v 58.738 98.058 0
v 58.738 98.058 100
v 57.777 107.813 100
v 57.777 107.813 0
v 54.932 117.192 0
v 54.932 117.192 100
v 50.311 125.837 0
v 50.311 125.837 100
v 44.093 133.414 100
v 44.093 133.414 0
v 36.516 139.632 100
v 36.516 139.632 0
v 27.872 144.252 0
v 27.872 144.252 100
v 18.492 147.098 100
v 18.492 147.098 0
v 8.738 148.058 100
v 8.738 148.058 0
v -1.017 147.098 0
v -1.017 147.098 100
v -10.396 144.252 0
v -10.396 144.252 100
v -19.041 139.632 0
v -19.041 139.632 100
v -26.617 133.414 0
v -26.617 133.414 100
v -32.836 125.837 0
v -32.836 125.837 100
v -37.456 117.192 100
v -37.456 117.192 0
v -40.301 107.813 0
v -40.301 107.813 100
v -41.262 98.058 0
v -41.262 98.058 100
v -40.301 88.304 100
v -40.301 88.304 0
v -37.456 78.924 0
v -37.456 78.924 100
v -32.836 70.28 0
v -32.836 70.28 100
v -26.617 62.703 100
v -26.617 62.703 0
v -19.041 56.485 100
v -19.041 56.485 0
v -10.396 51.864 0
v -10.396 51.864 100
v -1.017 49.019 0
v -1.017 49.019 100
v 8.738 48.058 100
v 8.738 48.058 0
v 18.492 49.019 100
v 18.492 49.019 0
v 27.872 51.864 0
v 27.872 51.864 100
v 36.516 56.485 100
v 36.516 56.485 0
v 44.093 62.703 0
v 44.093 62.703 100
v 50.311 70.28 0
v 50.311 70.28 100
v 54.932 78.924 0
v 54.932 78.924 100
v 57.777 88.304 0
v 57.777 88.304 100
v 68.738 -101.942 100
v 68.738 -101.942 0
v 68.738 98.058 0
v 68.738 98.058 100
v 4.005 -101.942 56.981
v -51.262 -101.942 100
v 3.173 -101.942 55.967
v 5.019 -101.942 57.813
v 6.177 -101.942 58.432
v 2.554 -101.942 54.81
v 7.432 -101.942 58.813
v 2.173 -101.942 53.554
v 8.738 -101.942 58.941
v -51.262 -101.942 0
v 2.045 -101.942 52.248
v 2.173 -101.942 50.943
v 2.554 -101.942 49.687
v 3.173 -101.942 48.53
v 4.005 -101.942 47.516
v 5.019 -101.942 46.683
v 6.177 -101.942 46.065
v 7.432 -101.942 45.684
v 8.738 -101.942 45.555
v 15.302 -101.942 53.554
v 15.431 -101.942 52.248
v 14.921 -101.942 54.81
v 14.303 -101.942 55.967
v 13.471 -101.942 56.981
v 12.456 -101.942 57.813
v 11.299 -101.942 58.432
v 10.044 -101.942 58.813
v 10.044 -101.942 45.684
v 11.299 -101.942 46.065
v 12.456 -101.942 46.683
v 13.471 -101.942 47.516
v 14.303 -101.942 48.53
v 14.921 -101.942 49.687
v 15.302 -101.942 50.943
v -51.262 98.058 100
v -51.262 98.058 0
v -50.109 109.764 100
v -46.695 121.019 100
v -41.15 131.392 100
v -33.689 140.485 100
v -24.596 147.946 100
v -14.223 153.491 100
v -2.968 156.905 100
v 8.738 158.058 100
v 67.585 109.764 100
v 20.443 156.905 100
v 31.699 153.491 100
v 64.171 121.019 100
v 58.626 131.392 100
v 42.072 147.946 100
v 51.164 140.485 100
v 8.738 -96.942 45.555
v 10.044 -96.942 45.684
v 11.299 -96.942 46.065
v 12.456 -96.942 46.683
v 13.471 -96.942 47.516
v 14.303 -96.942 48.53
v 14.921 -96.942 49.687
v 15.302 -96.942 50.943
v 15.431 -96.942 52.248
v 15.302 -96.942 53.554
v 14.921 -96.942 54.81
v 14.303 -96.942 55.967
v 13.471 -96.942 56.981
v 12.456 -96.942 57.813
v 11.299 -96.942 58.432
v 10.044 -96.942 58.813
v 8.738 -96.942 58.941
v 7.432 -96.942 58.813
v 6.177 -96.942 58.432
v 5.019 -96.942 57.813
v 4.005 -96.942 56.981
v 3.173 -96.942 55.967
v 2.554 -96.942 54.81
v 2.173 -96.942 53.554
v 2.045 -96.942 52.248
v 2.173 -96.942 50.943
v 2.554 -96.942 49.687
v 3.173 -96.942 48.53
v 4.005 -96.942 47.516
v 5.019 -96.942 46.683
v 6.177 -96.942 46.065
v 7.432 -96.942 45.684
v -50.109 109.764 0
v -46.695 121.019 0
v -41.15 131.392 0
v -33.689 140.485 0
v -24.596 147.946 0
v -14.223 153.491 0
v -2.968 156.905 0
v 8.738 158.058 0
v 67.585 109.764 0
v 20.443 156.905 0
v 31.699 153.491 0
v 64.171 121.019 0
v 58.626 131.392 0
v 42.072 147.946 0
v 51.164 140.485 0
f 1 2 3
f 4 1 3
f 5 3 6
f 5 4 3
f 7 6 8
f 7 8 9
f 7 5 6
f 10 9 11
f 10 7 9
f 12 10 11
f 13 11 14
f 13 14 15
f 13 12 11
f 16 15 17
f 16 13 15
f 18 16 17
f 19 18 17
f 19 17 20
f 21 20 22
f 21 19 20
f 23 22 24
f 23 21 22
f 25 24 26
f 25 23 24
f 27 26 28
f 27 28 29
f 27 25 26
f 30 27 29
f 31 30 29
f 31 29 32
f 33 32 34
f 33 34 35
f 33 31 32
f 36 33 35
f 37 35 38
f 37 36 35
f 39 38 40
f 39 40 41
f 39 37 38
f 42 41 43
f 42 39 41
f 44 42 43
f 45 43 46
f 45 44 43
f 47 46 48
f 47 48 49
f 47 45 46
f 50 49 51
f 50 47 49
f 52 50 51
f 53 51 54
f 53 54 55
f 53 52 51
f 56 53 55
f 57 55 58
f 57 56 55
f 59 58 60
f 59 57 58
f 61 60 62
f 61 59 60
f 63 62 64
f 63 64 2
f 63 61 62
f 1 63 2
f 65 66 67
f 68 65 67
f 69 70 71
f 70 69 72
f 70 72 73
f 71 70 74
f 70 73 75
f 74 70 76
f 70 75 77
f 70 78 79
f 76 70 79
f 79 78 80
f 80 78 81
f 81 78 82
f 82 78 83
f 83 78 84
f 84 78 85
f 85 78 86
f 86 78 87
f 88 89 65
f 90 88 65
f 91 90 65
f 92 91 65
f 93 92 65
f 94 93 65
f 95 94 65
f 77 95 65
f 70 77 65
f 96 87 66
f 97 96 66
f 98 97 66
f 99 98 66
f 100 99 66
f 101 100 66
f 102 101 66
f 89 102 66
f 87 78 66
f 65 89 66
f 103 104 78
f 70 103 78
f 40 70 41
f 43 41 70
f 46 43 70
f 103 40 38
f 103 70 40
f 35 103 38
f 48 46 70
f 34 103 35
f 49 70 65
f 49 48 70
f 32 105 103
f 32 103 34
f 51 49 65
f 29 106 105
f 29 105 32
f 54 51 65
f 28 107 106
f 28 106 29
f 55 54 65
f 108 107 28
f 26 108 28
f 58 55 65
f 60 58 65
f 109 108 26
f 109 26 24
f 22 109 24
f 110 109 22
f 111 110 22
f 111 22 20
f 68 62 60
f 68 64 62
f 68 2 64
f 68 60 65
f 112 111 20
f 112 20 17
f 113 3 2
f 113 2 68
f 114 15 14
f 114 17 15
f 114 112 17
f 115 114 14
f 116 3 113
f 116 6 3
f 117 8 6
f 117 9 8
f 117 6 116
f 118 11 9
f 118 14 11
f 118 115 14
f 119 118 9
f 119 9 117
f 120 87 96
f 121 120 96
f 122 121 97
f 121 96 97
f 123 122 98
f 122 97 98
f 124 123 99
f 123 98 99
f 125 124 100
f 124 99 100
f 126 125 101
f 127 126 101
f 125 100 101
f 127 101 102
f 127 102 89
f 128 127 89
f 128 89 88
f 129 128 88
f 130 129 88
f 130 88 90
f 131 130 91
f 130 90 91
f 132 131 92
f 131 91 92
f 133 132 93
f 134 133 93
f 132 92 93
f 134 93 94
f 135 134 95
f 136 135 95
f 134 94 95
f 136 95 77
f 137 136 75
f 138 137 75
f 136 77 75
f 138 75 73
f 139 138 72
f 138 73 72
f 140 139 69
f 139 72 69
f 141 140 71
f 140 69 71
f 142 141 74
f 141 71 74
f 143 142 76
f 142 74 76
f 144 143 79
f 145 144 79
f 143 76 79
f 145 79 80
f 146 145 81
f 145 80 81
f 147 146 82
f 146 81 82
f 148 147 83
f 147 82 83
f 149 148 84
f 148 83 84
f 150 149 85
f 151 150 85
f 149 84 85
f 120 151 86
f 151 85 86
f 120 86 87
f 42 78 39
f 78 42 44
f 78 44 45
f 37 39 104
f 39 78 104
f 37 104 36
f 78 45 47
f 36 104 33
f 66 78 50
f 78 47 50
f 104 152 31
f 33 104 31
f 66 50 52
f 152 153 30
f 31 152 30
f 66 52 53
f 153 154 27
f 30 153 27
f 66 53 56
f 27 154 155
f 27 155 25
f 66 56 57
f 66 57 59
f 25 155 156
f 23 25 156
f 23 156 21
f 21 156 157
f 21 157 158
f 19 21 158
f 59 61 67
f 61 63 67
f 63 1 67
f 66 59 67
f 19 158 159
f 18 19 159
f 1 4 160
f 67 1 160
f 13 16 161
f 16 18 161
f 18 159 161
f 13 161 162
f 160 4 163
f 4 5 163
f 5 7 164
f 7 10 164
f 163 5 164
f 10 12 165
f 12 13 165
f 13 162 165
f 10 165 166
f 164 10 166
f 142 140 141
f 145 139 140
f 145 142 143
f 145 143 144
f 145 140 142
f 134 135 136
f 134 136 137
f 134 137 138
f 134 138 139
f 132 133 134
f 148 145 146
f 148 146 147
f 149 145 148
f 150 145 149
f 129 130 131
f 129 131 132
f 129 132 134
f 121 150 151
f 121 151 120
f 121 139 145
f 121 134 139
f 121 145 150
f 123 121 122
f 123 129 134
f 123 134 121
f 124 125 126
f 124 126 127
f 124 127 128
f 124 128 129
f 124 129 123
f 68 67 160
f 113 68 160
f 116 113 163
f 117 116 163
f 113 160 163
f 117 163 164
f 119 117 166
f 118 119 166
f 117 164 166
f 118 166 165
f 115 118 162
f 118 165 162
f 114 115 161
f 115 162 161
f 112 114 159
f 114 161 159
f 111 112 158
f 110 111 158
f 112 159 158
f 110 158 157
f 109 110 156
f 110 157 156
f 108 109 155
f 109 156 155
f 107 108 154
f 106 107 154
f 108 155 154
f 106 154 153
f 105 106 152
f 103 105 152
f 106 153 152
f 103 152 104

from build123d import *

# Parameters (mm, degrees)
SKETCH_1_R          = 50
EXTRUDE_1_DEPTH     = 100
SKETCH_2_R          = 6.693038614
CUT_EXTRUDE_1_DEPTH = 5


with BuildPart() as part:
    # 草图1 → 凸台-拉伸1 (new body)
    with BuildSketch(Plane.XY):
        with BuildLine():
            Line((-51.262135922, 98.058252427), (-51.262135922, -101.941747573))
            Line((-51.262135922, -101.941747573), (68.737864078, -101.941747573))
            Line((68.737864078, -101.941747573), (68.737864078, 98.058252427))
            ThreePointArc((68.737864078, 98.058252427), (8.737864078, 158.058252427), (-51.262135922, 98.058252427))
        make_face()
        with Locations((8.737864078, 98.058252427)):
            Circle(SKETCH_1_R, mode=Mode.SUBTRACT)
    extrude(amount=EXTRUDE_1_DEPTH)

    # 草图2 → 切除-拉伸1 (cut)
    with BuildSketch(Plane(origin=(0, -101.941747573, 0), x_dir=(-1, 0, 0), z_dir=(0, -1, 0))):
        with Locations(Location((-8.737864078, -52.248339219, 0), (0, 0, 90))):
            Circle(SKETCH_2_R)
    extrude(amount=-CUT_EXTRUDE_1_DEPTH, mode=Mode.SUBTRACT)


solid = part.part
